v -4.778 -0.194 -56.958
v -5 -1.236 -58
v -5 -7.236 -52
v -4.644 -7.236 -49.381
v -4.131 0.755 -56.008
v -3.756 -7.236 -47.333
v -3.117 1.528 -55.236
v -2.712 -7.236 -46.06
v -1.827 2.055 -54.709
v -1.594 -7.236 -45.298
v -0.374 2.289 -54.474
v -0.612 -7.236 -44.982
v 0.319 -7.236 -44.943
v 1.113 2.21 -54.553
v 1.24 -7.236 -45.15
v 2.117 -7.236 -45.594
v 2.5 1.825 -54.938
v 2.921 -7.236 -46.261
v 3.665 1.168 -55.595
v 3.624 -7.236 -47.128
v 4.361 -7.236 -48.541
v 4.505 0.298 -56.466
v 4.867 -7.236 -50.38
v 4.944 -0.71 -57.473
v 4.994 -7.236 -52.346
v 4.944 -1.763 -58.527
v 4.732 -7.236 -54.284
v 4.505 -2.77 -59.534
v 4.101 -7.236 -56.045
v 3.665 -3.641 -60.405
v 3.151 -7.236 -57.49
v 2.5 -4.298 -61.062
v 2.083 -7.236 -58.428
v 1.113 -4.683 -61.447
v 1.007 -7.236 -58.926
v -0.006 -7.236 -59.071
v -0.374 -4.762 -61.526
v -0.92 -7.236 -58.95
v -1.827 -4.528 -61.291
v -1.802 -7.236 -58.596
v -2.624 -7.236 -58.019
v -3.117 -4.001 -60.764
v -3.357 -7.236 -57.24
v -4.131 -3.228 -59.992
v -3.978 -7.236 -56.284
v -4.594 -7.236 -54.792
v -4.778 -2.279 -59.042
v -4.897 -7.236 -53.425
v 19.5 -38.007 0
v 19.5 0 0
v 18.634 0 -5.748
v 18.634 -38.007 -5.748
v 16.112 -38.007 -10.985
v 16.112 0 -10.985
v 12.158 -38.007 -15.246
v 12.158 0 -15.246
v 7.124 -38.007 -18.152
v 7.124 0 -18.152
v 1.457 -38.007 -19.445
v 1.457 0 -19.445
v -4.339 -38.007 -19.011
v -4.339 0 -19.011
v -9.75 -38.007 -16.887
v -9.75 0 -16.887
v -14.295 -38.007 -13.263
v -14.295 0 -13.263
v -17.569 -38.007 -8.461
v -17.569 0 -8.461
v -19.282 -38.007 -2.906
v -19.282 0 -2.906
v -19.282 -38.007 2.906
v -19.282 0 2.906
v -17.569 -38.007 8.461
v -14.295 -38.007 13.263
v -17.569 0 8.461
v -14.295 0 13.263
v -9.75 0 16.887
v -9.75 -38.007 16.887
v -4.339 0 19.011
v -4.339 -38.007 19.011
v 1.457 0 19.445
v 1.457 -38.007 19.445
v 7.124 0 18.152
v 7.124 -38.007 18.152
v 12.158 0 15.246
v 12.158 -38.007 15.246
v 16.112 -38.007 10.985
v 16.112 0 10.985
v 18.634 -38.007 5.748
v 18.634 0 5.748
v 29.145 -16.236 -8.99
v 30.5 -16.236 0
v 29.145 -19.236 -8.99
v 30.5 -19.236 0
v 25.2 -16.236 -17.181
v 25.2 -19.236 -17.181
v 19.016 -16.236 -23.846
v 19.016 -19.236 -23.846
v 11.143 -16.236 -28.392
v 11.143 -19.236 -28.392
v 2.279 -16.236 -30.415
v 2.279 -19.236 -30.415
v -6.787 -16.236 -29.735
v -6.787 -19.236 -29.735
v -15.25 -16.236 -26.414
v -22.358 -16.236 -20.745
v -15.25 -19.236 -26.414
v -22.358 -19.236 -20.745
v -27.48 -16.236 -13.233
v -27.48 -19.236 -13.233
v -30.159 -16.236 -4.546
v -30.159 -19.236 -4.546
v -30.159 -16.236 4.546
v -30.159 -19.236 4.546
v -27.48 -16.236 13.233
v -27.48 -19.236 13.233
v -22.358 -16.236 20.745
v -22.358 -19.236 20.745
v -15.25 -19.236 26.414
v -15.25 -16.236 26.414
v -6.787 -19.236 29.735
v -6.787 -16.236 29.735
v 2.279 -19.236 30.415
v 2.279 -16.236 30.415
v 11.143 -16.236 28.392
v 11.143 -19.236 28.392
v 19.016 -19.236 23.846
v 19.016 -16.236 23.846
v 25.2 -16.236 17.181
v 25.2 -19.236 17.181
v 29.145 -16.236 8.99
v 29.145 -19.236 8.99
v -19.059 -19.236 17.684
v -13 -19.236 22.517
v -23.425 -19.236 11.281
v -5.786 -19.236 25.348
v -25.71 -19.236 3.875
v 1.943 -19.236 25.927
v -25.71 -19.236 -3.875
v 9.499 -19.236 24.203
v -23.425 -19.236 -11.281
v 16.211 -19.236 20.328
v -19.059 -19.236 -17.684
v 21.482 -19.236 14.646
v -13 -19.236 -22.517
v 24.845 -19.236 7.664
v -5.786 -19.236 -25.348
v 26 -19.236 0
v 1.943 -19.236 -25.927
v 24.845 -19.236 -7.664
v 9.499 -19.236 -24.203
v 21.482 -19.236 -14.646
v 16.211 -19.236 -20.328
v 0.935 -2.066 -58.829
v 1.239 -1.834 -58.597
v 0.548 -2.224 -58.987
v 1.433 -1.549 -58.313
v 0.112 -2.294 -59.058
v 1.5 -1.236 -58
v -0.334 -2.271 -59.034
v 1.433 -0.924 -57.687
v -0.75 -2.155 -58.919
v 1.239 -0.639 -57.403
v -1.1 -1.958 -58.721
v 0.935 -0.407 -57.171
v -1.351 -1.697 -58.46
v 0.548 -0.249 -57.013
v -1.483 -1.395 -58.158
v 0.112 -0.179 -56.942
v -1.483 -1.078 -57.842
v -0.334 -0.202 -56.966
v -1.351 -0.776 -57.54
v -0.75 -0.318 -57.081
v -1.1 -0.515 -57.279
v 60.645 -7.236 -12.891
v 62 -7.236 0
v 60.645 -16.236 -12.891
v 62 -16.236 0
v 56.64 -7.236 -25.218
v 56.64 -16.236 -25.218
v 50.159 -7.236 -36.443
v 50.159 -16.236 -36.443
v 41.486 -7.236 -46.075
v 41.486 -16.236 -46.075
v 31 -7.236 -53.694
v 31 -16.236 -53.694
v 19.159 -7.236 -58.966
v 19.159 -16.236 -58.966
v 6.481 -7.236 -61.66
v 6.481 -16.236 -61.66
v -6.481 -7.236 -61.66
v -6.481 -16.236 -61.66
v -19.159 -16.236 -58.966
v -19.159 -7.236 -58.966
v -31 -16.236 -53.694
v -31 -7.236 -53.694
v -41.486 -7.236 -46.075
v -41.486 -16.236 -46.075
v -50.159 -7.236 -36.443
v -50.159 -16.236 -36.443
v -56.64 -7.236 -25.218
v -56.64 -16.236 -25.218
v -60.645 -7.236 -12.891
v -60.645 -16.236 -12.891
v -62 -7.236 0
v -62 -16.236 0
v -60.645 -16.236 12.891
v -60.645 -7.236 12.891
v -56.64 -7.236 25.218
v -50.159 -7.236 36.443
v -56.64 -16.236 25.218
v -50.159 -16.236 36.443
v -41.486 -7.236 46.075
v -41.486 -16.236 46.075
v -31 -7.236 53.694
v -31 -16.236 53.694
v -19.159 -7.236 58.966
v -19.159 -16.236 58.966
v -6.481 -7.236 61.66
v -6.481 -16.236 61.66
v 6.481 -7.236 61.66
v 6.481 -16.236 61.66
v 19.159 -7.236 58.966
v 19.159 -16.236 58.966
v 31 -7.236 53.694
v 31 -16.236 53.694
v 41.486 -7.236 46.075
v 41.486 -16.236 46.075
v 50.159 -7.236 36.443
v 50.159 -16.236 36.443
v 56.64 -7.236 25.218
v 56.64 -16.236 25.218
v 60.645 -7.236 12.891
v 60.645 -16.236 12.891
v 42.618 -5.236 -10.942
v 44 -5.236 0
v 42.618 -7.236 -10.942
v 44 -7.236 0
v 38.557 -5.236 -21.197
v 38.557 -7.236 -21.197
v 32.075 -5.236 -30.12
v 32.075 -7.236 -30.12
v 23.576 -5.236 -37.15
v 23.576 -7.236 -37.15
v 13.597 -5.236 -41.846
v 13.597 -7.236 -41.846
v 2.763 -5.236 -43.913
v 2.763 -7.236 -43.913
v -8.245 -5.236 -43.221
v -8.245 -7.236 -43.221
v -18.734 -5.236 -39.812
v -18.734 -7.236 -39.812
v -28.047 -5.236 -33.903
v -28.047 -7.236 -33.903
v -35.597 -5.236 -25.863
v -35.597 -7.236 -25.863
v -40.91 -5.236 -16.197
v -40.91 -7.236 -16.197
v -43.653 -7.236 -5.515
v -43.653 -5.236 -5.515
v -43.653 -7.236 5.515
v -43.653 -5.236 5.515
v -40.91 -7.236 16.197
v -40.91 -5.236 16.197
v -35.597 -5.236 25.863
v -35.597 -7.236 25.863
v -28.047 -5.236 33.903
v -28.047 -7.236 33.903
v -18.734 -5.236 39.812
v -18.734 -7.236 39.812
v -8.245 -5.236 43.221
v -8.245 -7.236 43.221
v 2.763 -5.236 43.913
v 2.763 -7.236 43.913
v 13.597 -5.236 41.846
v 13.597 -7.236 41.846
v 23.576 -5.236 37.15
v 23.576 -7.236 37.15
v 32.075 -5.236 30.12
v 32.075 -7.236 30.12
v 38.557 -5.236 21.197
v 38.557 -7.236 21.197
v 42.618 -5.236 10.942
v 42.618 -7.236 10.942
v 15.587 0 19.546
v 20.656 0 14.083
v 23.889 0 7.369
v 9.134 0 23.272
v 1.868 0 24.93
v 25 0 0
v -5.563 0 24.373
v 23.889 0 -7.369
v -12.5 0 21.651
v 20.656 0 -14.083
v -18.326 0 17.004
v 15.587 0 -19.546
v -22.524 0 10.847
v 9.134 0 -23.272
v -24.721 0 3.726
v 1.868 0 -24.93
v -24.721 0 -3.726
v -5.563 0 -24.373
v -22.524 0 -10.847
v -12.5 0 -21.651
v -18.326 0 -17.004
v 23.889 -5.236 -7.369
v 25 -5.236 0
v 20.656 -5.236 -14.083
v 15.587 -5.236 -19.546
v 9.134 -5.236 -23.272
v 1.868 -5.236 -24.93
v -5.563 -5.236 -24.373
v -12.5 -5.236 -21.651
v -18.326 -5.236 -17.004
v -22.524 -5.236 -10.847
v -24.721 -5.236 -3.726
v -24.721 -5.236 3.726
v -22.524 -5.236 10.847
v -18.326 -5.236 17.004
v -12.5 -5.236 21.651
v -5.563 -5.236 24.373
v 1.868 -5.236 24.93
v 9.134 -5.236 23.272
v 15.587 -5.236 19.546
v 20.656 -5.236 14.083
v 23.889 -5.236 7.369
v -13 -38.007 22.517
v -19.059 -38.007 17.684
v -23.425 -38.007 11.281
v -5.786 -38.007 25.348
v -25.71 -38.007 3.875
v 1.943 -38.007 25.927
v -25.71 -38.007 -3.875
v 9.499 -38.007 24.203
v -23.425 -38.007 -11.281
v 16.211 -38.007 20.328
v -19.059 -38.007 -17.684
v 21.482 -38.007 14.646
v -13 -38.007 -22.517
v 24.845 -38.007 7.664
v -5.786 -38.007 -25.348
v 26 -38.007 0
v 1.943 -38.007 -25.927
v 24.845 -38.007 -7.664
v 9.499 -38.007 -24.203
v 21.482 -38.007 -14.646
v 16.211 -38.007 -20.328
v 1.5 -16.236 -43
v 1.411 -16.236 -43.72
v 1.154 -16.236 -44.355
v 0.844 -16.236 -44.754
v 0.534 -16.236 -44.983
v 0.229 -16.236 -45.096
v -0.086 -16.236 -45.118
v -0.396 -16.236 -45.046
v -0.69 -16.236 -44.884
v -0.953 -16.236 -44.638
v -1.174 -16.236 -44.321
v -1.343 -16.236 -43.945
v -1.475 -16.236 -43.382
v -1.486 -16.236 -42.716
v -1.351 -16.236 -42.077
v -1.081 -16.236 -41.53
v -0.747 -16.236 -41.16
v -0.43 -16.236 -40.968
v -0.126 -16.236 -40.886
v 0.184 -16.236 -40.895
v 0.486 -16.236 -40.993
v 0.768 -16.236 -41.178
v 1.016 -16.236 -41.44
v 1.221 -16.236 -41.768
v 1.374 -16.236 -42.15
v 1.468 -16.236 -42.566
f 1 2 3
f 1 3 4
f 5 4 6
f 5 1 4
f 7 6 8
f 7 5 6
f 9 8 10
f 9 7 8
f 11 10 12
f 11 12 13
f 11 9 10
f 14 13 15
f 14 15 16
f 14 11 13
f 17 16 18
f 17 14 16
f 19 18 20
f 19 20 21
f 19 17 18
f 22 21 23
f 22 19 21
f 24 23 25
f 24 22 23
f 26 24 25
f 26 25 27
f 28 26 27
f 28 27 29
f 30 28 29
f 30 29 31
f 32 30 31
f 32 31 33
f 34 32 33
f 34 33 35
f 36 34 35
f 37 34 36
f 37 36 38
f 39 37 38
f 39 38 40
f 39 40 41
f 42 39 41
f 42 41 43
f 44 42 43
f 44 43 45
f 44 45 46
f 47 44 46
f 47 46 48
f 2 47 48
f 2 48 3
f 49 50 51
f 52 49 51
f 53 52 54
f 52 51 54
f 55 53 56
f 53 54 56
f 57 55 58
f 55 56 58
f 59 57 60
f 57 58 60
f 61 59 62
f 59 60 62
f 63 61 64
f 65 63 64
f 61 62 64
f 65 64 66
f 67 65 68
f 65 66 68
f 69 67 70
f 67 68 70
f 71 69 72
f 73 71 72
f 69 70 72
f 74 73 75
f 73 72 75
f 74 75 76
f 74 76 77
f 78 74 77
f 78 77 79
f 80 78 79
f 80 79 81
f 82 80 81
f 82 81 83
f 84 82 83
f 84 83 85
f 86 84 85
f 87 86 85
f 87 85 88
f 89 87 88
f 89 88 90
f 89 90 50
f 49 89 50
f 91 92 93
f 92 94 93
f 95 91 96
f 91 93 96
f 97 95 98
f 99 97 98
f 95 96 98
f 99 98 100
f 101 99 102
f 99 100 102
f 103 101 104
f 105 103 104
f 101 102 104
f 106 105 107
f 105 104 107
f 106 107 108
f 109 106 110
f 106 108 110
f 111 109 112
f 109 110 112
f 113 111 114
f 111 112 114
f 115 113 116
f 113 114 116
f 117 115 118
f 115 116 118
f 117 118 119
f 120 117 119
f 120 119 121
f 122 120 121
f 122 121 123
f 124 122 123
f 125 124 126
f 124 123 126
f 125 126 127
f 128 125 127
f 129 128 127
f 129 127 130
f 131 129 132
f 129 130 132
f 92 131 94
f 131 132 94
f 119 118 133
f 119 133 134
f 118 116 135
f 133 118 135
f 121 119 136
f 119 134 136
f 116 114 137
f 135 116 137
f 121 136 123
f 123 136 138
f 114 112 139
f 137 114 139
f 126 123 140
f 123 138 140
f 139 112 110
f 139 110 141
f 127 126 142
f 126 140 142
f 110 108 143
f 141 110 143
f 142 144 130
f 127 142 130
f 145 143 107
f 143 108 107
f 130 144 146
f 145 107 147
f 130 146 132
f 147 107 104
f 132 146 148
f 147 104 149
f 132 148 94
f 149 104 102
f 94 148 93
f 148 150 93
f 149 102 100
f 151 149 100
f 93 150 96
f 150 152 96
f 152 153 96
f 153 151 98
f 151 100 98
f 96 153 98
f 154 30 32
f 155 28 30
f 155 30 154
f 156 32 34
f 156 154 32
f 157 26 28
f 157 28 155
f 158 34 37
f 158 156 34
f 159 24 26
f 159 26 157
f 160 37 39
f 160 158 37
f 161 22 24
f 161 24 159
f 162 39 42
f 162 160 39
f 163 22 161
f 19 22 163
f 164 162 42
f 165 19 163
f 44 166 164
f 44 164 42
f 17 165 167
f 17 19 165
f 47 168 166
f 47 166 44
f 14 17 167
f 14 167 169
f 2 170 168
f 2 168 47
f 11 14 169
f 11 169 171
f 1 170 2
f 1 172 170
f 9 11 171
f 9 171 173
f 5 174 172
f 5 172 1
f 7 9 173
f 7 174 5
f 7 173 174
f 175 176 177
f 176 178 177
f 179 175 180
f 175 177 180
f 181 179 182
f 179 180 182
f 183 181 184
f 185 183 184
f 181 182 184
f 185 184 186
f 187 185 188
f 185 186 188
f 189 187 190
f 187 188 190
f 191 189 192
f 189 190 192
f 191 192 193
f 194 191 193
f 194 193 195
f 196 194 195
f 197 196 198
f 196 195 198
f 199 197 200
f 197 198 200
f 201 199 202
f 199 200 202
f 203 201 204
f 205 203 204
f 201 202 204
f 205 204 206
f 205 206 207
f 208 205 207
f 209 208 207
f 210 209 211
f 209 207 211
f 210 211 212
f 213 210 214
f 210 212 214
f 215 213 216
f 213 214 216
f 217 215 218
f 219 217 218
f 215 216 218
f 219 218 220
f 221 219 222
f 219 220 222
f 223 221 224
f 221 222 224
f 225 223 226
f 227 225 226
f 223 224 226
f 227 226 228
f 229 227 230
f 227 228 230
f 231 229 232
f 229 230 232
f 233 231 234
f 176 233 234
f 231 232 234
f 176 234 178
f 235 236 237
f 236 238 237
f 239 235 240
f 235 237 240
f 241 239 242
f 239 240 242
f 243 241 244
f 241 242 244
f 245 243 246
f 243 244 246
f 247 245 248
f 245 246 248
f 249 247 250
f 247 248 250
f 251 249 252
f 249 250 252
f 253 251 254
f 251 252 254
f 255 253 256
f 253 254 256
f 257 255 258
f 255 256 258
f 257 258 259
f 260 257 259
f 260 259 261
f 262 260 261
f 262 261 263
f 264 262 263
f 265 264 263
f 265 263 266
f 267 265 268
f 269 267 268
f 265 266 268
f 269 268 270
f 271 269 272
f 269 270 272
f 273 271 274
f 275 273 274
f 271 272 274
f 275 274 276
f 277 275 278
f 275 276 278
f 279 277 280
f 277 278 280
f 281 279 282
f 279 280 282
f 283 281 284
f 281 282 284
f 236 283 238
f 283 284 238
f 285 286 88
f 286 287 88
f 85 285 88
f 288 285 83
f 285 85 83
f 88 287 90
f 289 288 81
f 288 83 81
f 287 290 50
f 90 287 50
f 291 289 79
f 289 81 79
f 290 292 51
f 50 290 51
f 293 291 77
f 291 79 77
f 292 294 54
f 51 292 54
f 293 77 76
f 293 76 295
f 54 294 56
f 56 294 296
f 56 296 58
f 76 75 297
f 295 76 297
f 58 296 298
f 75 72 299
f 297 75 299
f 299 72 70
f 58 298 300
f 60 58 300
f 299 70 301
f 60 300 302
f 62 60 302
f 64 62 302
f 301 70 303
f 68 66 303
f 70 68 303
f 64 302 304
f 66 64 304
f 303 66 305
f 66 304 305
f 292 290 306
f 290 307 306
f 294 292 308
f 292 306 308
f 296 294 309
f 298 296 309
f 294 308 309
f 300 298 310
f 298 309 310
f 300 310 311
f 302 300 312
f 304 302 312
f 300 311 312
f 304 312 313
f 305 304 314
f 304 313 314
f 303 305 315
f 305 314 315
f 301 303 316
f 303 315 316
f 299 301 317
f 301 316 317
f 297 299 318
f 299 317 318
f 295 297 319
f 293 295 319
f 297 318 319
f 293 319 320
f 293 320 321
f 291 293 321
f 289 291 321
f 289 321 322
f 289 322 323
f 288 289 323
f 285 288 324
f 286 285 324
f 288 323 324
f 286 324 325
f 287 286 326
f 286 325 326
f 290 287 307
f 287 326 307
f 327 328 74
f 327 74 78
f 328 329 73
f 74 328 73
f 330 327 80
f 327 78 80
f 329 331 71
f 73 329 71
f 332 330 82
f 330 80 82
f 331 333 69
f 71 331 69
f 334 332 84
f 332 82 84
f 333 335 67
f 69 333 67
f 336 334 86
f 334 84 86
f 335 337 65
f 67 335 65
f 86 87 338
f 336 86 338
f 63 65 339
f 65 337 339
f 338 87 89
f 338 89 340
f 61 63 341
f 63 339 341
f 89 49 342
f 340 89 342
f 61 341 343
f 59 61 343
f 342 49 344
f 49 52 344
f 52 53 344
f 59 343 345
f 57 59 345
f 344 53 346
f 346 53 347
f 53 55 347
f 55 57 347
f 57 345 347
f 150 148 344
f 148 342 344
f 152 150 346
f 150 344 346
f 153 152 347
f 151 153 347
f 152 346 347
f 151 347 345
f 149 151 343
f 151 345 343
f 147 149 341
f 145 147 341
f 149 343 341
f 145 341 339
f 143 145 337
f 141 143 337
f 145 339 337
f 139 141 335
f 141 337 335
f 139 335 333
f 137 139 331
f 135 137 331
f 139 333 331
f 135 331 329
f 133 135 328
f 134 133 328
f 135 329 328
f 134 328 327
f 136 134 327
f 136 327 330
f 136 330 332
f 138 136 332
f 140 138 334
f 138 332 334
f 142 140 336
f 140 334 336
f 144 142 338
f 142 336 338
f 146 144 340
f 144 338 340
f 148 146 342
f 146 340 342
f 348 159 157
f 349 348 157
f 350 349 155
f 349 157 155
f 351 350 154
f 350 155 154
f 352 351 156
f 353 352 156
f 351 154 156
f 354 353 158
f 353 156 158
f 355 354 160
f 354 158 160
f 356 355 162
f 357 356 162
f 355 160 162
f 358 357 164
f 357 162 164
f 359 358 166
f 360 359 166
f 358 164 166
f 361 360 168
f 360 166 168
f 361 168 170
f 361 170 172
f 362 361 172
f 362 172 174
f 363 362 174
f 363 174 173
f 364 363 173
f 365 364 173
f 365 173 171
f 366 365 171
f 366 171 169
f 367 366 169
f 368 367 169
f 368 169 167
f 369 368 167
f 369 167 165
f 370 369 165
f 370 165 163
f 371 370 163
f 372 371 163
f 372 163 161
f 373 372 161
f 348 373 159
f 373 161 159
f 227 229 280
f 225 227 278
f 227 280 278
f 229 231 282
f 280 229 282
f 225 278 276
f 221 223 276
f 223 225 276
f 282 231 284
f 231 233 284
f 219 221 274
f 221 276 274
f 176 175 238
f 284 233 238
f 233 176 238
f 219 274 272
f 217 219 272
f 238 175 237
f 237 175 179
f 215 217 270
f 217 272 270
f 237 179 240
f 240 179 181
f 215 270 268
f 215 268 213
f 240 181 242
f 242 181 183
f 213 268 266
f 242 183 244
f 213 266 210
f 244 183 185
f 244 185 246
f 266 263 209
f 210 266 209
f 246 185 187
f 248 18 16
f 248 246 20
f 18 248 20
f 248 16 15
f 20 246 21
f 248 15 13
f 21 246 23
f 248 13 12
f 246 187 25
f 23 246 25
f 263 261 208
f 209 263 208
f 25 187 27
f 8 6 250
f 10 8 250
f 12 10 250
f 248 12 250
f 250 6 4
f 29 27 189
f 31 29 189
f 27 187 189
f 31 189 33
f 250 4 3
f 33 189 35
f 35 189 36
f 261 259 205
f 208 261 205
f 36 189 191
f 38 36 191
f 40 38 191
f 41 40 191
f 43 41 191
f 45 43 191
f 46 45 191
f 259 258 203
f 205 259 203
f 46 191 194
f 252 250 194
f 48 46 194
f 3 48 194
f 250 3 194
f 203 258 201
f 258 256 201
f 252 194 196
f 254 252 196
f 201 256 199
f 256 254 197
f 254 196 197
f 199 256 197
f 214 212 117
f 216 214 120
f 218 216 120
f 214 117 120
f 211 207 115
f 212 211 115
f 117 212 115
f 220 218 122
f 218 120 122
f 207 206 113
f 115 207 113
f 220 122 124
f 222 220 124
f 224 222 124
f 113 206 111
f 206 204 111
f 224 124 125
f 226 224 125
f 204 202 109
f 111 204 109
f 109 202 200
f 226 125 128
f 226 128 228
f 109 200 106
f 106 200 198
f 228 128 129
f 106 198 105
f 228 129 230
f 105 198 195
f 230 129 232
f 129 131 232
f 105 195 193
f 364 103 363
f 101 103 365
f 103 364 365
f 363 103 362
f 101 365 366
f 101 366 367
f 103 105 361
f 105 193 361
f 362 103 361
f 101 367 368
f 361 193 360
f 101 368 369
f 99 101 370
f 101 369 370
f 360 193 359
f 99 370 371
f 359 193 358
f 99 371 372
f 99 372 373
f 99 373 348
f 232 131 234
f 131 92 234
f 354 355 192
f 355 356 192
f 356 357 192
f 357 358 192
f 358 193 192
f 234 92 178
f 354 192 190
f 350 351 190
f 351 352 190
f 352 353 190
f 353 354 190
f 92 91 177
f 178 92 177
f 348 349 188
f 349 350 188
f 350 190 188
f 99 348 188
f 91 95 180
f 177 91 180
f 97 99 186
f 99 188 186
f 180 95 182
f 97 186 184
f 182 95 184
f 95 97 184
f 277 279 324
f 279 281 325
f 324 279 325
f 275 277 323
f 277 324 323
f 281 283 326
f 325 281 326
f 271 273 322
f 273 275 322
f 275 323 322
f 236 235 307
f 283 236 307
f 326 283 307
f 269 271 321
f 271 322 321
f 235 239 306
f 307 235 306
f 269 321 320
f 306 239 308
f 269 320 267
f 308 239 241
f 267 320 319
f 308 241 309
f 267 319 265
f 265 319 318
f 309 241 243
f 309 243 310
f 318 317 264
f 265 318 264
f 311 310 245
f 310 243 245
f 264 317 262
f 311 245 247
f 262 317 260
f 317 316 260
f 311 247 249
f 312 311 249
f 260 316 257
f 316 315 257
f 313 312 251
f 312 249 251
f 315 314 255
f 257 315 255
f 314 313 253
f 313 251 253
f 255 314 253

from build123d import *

# Parameters (mm, degrees)
SKETCH2_R           = 19.5
CUT_EXTRUDE1_DEPTH  = 90
BOSS_EXTRUDE1_REACH = 112.853
SKETCH5_R           = 5
SKETCH6_R           = 1.5
CUT_EXTRUDE3_DEPTH  = 28


with BuildPart() as part:
    # Sketch1 → Revolve2 (revolve)
    with BuildSketch(Plane.XY):
        Polygon((0, 0), (25, 0), (25, -5.236486486), (44, -5.236486486), (44, -7.236486486), (62, -7.236486486), (62, -16.236486486), (30.5, -16.236486486), (30.5, -19.236486486), (26, -19.236486486), (26, -38.006756757), (0, -38.006756757), align=None)
    revolve(axis=Axis((0, -38.006756757, 0), (0, 1, 0)))

    # Sketch2 → Cut-Extrude1 (cut)
    with BuildSketch(Plane(origin=(0, 0, 0), x_dir=(1, 0, 0), z_dir=(0, 1, 0))):
        Circle(SKETCH2_R)
    extrude(amount=-CUT_EXTRUDE1_DEPTH, mode=Mode.SUBTRACT)

    # Boss-Extrude1: up to this face of the body (flat: up to its plane)
    boss_extrude1_end = Plane(part.part.faces().sort_by_distance((-45.753624817, -7.236486486, 0))[0])
    # Sketch5 → Boss-Extrude1 (add, up to the picked face)
    with BuildSketch(Plane(origin=(0, -1.236486486, -58), x_dir=(-1, 0, 0), z_dir=(0, 0.707106781, -0.707106781)), mode=Mode.PRIVATE) as boss_extrude1_sk1:
        Circle(SKETCH5_R)
    boss_extrude1_tool1 = split(extrude(boss_extrude1_sk1.sketch, amount=-BOSS_EXTRUDE1_REACH, mode=Mode.PRIVATE), bisect_by=boss_extrude1_end, keep=Keep.BOTH, mode=Mode.PRIVATE)
    add(boss_extrude1_tool1.solids().sort_by_distance((0, -1.236486, -58))[0])

    # Sketch6 → Cut-Extrude3 (cut)
    with BuildSketch(Plane(origin=(0, 28.381756757, -28.381756757), x_dir=(1, 0, 0), z_dir=(0, 0.707106781, -0.707106781))):
        with Locations((0, 41.886521288)):
            Circle(SKETCH6_R)
    extrude(amount=-CUT_EXTRUDE3_DEPTH, mode=Mode.SUBTRACT)


solid = part.part
